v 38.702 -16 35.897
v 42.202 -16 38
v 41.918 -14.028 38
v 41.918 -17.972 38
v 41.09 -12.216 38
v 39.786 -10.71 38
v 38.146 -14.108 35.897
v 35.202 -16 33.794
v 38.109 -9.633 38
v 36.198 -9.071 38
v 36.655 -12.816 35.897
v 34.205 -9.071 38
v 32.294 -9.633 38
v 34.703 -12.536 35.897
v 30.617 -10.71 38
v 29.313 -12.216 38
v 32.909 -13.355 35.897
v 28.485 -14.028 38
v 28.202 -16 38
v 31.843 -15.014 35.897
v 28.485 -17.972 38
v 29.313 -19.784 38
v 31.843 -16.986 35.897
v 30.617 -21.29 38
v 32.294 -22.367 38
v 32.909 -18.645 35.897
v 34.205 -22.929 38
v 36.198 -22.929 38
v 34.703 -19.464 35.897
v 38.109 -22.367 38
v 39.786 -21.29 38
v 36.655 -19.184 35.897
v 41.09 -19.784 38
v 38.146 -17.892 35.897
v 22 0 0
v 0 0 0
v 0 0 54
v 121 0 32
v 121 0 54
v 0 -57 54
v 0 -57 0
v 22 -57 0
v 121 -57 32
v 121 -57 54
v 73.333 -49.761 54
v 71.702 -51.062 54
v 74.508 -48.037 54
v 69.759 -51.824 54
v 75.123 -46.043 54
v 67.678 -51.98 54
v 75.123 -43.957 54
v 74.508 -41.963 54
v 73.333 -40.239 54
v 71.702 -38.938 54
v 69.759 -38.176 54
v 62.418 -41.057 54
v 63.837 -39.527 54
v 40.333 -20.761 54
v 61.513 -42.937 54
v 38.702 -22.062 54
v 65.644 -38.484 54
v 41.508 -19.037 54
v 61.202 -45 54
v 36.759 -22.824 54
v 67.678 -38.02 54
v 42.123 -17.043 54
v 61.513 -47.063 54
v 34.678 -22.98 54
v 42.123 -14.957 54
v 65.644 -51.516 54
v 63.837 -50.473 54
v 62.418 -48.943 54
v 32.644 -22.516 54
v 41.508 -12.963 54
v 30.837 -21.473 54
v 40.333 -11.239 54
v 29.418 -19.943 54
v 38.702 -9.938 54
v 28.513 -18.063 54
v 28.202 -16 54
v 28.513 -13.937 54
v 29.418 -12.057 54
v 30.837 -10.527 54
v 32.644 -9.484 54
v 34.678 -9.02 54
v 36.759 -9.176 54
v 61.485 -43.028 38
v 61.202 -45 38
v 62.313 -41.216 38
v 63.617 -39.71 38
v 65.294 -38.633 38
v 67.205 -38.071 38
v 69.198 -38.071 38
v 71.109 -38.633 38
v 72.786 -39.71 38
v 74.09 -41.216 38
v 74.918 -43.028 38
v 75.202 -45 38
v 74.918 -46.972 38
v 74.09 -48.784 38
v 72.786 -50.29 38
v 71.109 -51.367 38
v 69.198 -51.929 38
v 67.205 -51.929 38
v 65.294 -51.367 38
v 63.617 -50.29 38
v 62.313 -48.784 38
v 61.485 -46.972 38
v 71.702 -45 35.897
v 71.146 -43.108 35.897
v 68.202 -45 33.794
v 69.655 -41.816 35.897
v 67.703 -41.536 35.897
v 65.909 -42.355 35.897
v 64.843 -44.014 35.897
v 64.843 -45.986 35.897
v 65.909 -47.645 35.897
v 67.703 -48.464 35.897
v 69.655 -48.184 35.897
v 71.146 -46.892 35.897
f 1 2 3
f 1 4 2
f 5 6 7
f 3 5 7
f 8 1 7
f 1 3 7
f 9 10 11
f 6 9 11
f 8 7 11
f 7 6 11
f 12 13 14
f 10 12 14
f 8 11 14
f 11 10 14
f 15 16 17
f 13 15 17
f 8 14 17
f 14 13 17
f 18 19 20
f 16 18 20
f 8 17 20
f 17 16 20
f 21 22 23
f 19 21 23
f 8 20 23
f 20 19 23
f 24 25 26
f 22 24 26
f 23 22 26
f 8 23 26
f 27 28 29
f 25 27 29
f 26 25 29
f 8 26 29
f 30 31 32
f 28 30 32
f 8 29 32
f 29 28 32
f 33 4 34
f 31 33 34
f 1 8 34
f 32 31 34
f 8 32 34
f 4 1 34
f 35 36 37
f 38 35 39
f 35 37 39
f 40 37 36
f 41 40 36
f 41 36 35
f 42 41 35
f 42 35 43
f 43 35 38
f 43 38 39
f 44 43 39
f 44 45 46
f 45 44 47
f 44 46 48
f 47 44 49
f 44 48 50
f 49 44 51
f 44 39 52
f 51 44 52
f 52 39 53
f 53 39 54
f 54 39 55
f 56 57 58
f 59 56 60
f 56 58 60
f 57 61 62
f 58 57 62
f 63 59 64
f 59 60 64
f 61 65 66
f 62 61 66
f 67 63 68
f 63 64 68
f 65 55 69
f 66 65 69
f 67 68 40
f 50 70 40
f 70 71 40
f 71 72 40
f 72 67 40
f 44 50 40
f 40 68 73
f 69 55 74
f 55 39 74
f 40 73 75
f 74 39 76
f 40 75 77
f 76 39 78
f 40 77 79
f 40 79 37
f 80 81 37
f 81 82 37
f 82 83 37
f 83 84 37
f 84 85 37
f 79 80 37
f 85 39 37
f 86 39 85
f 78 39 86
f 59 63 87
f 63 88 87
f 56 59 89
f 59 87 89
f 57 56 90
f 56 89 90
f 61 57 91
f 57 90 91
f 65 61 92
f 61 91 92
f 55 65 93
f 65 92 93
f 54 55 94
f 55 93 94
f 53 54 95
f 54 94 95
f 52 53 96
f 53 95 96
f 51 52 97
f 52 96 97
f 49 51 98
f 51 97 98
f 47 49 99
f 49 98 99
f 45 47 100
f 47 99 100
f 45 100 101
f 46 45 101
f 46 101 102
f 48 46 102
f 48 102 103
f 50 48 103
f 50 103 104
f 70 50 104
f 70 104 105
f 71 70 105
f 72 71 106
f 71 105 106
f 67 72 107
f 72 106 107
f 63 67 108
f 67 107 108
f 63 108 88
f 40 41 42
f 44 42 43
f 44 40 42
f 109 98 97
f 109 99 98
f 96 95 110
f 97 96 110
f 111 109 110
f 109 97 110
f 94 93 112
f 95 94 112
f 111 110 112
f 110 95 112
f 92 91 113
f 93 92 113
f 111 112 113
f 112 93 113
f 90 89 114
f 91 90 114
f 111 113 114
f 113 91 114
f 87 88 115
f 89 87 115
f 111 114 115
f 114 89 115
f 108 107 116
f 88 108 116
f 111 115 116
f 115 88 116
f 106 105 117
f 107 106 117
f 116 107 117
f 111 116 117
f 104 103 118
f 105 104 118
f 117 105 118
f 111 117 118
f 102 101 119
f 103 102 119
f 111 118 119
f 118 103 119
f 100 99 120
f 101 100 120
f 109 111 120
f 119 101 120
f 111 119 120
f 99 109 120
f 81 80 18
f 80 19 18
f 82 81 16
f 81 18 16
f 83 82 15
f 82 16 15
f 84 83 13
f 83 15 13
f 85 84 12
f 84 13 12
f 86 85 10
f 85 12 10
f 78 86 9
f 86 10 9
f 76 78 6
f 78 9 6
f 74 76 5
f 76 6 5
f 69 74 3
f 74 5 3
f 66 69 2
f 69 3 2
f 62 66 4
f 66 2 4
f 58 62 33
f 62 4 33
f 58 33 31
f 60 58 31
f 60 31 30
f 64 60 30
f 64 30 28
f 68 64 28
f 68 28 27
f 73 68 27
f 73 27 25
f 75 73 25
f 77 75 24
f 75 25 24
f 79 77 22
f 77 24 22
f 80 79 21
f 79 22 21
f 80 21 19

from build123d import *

# Parameters (mm, degrees)
F1_DEPTH = 57
F3_D     = 14
F3_DEPTH = 16
F3_TIP   = 4.2060243332


with BuildPart() as f1:
    # F0 (on Front) → F1 (new body)
    with BuildSketch(Plane.XZ):
        Polygon((121, 54), (0, 54), (0, 0), (22, 0), (121, 32), align=None)
    extrude(amount=F1_DEPTH)

    # F3
    with Locations(Plane.XY.offset(54)):
        with Locations((35.2015122771, -16), (68.2015122771, -45)):
            Hole(F3_D / 2, depth=F3_DEPTH)
            with Locations((0, 0, -(F3_DEPTH + F3_TIP / 2))):  # 118° drill point
                Cone(0, F3_D / 2, F3_TIP, mode=Mode.SUBTRACT)


solid = f1.part
